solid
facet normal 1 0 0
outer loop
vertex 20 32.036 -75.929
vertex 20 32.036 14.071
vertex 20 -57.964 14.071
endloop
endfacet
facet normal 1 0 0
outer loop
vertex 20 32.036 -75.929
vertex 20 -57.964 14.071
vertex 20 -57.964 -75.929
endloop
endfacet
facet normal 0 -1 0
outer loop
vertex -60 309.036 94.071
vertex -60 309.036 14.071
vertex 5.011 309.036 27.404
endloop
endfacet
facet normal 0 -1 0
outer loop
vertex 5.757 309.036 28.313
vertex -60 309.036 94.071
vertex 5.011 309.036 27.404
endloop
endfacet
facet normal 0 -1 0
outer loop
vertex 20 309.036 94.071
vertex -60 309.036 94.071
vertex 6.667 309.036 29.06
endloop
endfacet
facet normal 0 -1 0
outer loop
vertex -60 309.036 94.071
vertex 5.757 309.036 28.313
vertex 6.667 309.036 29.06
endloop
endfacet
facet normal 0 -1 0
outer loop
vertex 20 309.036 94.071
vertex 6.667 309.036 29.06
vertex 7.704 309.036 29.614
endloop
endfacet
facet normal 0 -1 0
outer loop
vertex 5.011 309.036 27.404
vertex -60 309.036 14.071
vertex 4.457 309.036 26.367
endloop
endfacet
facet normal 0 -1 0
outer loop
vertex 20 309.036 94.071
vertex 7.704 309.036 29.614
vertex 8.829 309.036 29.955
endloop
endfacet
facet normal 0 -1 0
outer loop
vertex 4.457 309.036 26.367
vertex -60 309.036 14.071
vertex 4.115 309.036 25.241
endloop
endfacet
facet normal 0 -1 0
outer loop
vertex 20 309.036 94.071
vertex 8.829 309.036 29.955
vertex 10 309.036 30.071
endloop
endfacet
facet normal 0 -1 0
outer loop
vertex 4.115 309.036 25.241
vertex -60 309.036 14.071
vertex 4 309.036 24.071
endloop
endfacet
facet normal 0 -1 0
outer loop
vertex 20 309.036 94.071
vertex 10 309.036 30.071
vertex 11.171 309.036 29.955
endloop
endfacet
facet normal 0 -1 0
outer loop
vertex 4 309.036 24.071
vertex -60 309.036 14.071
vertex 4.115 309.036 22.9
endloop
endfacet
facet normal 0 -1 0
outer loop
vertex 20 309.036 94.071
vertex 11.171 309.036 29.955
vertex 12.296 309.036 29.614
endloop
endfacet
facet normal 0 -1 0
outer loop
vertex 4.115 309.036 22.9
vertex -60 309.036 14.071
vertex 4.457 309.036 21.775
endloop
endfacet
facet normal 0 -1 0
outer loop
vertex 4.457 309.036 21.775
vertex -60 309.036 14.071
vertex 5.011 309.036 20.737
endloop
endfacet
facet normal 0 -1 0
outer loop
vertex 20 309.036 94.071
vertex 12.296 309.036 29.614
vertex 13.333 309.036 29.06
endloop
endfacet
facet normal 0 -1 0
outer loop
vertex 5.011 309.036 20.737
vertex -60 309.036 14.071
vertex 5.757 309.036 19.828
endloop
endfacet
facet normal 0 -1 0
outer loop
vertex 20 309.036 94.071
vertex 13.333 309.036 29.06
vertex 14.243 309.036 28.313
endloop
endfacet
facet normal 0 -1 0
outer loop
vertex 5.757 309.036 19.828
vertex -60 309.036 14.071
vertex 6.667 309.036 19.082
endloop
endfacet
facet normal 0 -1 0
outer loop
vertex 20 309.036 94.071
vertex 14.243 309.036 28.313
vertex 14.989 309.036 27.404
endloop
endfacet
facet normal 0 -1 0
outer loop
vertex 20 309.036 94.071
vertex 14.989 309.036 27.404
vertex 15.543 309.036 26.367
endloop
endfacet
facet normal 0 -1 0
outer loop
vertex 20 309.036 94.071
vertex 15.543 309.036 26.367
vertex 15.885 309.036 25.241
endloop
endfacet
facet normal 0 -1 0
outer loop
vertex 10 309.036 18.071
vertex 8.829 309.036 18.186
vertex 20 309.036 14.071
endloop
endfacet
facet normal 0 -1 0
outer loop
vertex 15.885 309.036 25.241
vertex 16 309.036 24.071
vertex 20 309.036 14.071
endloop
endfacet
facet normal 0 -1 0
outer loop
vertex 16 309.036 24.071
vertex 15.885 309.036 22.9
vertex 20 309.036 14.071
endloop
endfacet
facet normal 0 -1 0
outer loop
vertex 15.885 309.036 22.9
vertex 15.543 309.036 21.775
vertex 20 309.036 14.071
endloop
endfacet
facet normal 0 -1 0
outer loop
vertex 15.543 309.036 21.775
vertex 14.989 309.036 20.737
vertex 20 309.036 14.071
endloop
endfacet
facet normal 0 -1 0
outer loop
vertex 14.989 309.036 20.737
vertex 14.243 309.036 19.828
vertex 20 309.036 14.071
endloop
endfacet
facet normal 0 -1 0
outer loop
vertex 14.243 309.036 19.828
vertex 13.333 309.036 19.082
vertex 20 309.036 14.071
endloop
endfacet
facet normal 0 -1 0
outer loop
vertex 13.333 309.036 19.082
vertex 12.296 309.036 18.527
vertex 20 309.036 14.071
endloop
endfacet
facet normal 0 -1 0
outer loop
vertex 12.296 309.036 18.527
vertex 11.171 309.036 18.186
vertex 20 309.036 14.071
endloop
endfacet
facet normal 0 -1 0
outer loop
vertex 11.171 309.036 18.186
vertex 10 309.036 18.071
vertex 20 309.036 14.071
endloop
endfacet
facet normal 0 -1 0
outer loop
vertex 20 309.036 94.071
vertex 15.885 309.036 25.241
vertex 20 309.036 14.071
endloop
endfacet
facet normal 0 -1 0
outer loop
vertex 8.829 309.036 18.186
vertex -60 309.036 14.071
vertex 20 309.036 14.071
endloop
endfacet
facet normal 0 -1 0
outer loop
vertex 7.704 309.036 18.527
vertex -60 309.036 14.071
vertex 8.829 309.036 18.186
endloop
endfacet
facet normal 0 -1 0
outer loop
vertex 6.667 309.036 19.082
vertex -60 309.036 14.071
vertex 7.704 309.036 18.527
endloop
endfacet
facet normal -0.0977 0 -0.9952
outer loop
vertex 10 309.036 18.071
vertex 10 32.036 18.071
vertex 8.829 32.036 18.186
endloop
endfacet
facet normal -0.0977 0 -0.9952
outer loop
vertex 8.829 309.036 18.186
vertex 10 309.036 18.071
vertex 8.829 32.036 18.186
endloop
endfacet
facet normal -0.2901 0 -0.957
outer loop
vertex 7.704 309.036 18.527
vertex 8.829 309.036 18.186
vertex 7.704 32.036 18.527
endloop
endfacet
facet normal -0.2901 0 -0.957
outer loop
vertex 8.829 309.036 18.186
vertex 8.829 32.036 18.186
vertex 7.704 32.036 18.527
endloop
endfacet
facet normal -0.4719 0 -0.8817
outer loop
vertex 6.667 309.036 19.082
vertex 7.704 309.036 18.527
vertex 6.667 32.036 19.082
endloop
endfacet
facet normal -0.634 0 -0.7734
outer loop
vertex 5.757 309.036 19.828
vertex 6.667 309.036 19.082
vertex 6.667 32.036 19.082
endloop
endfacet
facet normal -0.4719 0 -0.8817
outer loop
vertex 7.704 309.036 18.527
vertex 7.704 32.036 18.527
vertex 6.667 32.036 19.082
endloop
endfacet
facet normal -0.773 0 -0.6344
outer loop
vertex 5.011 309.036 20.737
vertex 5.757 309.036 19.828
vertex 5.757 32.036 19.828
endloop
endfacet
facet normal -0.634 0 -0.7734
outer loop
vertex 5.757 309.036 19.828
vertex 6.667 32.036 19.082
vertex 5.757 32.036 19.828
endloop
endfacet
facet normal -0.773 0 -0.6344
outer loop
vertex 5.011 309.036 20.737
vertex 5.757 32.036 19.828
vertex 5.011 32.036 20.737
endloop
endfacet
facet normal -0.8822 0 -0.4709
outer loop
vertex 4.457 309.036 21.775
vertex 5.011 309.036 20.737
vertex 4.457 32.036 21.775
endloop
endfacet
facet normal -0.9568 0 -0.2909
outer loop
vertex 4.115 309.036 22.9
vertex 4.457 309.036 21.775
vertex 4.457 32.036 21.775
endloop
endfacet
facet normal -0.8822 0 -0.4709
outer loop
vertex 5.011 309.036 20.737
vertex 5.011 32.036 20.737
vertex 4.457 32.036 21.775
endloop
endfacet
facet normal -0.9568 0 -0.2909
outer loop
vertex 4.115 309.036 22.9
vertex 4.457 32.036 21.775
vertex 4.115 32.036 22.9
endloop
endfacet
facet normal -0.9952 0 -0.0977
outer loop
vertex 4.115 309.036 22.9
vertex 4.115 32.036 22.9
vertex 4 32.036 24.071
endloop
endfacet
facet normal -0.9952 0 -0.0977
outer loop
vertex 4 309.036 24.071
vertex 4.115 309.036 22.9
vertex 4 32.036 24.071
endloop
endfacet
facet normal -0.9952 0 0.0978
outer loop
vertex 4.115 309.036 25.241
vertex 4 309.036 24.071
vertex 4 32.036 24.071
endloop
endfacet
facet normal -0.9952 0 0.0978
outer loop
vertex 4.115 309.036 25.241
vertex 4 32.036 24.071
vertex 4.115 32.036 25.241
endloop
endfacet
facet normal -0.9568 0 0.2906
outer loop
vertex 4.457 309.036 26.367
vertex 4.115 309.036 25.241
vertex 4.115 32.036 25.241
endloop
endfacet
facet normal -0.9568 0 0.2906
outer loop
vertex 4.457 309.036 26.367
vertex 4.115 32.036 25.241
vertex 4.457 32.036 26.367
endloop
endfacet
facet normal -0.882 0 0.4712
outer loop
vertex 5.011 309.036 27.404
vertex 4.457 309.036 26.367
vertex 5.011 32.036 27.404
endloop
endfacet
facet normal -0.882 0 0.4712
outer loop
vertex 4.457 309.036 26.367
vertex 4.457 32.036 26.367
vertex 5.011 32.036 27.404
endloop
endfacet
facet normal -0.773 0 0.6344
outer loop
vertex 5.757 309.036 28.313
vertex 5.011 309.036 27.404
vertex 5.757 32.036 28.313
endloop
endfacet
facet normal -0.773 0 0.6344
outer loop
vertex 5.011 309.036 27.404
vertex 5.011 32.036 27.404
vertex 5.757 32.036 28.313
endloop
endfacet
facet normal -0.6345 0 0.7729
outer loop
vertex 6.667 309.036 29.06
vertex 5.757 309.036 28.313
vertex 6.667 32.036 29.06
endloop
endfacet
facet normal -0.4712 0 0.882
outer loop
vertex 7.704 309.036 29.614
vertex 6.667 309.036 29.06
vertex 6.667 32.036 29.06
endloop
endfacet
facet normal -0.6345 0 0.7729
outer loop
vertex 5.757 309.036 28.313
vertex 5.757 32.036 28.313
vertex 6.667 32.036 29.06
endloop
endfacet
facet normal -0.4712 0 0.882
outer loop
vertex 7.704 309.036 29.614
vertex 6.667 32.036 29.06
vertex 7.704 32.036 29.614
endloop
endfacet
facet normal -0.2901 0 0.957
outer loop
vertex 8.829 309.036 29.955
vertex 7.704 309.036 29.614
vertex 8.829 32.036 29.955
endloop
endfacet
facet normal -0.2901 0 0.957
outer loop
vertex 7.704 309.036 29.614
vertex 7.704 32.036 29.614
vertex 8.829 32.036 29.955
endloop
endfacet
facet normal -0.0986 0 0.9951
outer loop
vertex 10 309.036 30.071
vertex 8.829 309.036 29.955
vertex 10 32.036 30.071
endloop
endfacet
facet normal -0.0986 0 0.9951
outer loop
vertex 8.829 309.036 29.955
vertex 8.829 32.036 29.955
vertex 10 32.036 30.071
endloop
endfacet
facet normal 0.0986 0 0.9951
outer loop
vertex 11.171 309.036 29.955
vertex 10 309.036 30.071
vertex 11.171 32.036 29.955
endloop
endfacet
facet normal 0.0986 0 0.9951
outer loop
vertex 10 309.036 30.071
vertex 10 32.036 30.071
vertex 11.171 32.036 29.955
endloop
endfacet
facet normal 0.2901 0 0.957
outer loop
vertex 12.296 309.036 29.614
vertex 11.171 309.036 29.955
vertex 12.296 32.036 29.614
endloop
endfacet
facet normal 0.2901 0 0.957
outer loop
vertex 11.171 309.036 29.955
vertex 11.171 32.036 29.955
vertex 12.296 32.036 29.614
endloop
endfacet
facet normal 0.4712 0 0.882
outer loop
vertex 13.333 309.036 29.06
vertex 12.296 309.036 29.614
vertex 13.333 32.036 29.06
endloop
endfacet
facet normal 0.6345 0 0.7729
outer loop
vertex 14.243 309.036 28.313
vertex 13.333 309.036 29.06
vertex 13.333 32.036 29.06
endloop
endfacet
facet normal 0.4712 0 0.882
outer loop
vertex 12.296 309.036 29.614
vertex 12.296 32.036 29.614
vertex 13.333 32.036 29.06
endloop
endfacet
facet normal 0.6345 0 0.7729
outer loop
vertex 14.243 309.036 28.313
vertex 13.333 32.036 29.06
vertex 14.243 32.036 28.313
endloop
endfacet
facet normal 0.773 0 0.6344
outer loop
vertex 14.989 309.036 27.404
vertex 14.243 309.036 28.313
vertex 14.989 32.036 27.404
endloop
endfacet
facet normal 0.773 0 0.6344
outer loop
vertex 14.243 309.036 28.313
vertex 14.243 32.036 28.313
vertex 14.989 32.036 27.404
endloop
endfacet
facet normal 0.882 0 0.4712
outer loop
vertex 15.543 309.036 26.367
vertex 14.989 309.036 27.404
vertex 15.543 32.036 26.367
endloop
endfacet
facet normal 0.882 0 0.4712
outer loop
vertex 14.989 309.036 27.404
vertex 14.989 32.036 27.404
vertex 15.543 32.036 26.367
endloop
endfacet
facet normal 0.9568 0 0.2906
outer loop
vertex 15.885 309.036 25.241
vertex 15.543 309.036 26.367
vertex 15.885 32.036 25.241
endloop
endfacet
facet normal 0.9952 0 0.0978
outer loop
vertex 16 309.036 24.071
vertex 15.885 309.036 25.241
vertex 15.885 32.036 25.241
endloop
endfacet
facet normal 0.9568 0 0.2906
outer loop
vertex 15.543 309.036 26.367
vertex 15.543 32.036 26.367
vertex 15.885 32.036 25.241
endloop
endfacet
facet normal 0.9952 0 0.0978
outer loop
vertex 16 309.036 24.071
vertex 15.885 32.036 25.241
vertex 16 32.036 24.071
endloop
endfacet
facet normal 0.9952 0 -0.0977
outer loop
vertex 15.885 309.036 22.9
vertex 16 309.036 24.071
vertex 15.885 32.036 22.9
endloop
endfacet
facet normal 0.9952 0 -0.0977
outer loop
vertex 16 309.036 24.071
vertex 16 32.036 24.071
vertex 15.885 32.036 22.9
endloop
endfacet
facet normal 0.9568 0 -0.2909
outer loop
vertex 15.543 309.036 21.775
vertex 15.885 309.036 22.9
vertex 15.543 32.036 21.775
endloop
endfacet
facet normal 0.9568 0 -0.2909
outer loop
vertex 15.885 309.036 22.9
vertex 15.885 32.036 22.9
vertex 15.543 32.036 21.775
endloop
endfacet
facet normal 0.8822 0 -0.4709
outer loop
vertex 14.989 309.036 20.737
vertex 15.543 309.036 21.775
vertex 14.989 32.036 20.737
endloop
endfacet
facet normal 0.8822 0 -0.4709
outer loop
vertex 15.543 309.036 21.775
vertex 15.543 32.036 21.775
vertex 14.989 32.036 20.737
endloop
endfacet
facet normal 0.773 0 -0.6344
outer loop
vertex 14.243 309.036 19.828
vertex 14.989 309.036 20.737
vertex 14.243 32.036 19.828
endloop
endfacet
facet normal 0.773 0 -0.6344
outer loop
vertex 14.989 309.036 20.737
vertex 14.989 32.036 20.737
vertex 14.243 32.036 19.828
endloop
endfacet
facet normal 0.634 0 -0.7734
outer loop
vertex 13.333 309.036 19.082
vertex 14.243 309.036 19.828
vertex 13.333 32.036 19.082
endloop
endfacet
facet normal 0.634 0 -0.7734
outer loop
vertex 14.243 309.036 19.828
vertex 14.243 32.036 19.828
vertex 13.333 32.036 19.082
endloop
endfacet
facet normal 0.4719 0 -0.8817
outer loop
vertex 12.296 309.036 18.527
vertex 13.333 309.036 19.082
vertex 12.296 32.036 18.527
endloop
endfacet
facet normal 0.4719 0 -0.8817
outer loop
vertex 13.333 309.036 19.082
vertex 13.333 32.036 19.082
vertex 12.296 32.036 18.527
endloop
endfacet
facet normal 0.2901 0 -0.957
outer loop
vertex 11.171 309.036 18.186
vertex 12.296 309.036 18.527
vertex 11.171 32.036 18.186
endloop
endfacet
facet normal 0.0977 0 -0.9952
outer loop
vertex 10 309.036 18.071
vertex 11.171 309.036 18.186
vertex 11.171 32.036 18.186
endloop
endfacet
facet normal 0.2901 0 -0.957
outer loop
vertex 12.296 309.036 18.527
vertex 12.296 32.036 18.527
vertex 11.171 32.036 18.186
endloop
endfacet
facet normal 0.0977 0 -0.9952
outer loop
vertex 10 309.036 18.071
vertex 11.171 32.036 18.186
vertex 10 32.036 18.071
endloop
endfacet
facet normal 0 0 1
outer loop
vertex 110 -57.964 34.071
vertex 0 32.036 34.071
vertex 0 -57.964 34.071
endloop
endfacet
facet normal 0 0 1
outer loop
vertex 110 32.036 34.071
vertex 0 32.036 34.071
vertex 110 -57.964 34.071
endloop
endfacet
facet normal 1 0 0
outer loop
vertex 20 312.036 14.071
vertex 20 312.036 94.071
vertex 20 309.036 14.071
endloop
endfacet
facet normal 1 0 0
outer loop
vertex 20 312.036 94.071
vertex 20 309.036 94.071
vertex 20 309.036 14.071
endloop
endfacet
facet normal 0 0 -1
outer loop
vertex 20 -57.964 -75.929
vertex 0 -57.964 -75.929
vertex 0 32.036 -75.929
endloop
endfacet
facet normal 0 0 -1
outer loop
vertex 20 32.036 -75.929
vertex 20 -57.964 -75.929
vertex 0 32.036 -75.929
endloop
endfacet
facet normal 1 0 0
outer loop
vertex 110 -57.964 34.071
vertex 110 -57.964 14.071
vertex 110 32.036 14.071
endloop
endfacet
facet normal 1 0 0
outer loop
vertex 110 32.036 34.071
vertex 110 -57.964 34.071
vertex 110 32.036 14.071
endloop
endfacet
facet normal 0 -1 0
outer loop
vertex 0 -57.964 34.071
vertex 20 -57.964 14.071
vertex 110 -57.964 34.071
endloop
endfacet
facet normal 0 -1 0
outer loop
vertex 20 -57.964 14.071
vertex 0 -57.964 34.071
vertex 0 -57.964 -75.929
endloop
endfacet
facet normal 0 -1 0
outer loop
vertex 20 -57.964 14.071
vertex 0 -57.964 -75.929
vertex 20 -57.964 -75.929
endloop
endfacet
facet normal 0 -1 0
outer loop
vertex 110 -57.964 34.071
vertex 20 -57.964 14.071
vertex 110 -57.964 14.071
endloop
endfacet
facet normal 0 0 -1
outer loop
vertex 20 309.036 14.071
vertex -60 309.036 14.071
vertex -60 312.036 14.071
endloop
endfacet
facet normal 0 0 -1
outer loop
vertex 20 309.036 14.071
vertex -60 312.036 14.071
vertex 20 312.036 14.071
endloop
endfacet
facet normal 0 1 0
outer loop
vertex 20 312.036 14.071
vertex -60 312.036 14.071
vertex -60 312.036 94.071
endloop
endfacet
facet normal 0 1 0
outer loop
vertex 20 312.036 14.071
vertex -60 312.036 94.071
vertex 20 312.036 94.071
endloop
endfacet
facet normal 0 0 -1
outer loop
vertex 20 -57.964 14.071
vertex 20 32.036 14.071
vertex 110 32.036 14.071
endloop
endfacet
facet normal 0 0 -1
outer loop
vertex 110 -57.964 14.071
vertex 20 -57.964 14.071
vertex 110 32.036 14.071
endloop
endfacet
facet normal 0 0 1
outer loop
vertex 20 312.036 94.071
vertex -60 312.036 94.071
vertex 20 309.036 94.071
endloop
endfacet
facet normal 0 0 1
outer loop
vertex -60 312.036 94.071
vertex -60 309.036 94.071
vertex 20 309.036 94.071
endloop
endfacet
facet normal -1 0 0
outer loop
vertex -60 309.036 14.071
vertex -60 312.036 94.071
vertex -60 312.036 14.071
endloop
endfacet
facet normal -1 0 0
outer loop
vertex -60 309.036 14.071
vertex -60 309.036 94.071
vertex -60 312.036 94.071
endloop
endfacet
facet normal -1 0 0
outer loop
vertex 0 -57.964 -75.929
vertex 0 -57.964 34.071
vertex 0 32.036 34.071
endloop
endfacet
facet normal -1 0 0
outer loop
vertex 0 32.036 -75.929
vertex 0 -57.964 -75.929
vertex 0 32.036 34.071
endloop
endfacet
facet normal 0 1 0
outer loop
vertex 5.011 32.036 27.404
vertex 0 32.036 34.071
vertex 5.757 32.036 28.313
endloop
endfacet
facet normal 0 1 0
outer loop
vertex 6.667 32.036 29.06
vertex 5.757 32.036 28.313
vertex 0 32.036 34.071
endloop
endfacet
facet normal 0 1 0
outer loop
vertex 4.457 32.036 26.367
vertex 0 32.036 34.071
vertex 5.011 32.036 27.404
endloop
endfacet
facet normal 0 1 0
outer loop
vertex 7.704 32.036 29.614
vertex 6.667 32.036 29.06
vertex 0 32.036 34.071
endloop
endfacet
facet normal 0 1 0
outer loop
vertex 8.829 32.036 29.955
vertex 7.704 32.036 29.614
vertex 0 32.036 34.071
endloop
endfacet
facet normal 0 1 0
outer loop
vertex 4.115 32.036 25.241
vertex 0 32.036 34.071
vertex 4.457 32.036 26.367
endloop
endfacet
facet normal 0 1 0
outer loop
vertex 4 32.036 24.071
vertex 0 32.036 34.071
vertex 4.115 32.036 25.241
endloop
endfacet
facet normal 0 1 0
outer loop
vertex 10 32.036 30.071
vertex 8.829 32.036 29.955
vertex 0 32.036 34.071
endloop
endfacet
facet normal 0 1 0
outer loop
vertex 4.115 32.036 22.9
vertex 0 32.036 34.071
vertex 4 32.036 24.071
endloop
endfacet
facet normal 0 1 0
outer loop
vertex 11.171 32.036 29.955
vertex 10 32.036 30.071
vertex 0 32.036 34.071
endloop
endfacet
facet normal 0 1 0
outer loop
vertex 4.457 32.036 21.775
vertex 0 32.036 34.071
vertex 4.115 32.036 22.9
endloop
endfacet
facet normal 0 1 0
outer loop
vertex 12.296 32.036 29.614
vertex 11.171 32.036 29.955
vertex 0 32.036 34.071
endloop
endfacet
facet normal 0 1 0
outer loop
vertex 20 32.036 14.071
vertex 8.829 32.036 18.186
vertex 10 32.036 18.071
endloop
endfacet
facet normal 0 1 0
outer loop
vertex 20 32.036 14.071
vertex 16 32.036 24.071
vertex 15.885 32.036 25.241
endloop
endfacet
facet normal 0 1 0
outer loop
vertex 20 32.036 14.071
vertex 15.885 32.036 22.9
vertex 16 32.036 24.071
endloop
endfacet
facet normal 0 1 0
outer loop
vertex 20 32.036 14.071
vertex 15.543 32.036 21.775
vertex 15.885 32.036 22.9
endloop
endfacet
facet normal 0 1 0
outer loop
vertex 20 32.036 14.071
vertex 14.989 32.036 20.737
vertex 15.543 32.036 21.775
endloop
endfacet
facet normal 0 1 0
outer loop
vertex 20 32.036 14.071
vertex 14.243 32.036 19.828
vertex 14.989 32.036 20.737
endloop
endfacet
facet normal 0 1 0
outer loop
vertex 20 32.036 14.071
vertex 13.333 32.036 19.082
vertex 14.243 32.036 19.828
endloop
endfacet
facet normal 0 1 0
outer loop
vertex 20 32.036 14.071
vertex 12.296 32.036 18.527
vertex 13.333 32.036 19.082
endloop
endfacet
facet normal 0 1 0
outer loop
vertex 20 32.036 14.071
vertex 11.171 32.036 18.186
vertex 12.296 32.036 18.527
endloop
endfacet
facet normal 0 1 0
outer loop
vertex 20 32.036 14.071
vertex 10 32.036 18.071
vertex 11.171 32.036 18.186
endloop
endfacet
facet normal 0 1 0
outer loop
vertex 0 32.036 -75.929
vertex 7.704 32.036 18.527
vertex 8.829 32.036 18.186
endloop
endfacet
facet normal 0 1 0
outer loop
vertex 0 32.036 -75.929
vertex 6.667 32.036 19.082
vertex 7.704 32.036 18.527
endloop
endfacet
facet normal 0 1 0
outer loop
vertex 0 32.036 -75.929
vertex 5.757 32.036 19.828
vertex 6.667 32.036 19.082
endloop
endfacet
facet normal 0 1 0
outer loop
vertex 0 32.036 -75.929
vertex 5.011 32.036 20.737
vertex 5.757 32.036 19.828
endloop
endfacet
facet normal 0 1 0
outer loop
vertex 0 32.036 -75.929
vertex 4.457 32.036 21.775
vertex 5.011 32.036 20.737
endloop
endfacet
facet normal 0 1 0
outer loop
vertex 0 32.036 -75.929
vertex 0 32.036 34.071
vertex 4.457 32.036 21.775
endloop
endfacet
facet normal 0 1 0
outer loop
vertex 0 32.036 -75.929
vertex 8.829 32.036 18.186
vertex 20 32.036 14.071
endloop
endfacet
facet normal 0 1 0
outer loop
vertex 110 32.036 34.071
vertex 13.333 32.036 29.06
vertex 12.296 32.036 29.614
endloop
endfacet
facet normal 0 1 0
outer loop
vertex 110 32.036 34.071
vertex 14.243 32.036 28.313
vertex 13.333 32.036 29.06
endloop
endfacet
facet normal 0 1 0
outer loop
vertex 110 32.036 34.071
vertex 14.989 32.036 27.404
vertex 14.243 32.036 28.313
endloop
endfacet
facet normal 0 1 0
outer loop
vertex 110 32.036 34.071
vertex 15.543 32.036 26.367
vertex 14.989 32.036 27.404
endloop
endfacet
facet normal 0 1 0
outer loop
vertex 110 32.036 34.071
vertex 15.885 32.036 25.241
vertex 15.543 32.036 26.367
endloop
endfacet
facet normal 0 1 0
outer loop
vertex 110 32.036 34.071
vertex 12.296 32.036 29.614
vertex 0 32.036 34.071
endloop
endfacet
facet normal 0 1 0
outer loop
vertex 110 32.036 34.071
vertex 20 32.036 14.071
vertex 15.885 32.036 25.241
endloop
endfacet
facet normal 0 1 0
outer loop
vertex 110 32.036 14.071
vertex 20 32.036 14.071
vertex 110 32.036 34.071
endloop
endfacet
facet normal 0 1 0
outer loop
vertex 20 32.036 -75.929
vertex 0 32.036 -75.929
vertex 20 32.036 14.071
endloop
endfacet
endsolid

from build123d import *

# Parameters (mm, degrees)
ESQUISSE1_W        = 90
ESQUISSE1_H        = 90
BOSS_EXTRU_1_DEPTH = 20
ESQUISSE5_W        = 110
ESQUISSE5_H        = 90
BOSS_EXTRU_5_DEPTH = 20
ESQUISSE2_R        = 6
BOSS_EXTRU_2_DEPTH = 277
ESQUISSE3_W        = 80
ESQUISSE3_H        = 80
BOSS_EXTRU_3_DEPTH = 2.9
ESQUISSE4_W        = 80
ESQUISSE4_H        = 80
BOSS_EXTRU_4_DEPTH = 0.1


with BuildPart() as part:
    # Esquisse1 → Boss.-Extru.1 (new body)
    with BuildSketch(Plane(origin=(0, 0, 0), x_dir=(0, 0, -1), z_dir=(1, 0, 0))):
        with Locations((30.929303344, -12.964038863)):
            Rectangle(ESQUISSE1_W, ESQUISSE1_H)
    extrude(amount=BOSS_EXTRU_1_DEPTH)

    # Esquisse5 → Boss.-Extru.5 (add)
    with BuildSketch(Plane.XY.offset(14.070696656)):
        with Locations((55, -12.964038863)):
            Rectangle(ESQUISSE5_W, ESQUISSE5_H)
    extrude(amount=BOSS_EXTRU_5_DEPTH)

    # Esquisse2 → Boss.-Extru.2 (add)
    with BuildSketch(Plane(origin=(0, 32.035961137, 0), x_dir=(1, 0, 0), z_dir=(0, 1, 0))):
        with Locations(Location((10, -24.070696656, 0), (0, 0, 90))):
            Circle(ESQUISSE2_R)
    extrude(amount=BOSS_EXTRU_2_DEPTH)

    # Esquisse3 → Boss.-Extru.3 (add)
    with BuildSketch(Plane(origin=(0, 309.035961137, 0), x_dir=(1, 0, 0), z_dir=(0, 1, 0))):
        with Locations((-20, -54.070696656)):
            Rectangle(ESQUISSE3_W, ESQUISSE3_H)
    extrude(amount=BOSS_EXTRU_3_DEPTH)

    # Esquisse4 → Boss.-Extru.4 (add)
    with BuildSketch(Plane(origin=(0, 311.935961137, 0), x_dir=(1, 0, 0), z_dir=(0, 1, 0))):
        with Locations((-20, -54.070696656)):
            Rectangle(ESQUISSE4_W, ESQUISSE4_H)
    extrude(amount=BOSS_EXTRU_4_DEPTH)


solid = part.part
